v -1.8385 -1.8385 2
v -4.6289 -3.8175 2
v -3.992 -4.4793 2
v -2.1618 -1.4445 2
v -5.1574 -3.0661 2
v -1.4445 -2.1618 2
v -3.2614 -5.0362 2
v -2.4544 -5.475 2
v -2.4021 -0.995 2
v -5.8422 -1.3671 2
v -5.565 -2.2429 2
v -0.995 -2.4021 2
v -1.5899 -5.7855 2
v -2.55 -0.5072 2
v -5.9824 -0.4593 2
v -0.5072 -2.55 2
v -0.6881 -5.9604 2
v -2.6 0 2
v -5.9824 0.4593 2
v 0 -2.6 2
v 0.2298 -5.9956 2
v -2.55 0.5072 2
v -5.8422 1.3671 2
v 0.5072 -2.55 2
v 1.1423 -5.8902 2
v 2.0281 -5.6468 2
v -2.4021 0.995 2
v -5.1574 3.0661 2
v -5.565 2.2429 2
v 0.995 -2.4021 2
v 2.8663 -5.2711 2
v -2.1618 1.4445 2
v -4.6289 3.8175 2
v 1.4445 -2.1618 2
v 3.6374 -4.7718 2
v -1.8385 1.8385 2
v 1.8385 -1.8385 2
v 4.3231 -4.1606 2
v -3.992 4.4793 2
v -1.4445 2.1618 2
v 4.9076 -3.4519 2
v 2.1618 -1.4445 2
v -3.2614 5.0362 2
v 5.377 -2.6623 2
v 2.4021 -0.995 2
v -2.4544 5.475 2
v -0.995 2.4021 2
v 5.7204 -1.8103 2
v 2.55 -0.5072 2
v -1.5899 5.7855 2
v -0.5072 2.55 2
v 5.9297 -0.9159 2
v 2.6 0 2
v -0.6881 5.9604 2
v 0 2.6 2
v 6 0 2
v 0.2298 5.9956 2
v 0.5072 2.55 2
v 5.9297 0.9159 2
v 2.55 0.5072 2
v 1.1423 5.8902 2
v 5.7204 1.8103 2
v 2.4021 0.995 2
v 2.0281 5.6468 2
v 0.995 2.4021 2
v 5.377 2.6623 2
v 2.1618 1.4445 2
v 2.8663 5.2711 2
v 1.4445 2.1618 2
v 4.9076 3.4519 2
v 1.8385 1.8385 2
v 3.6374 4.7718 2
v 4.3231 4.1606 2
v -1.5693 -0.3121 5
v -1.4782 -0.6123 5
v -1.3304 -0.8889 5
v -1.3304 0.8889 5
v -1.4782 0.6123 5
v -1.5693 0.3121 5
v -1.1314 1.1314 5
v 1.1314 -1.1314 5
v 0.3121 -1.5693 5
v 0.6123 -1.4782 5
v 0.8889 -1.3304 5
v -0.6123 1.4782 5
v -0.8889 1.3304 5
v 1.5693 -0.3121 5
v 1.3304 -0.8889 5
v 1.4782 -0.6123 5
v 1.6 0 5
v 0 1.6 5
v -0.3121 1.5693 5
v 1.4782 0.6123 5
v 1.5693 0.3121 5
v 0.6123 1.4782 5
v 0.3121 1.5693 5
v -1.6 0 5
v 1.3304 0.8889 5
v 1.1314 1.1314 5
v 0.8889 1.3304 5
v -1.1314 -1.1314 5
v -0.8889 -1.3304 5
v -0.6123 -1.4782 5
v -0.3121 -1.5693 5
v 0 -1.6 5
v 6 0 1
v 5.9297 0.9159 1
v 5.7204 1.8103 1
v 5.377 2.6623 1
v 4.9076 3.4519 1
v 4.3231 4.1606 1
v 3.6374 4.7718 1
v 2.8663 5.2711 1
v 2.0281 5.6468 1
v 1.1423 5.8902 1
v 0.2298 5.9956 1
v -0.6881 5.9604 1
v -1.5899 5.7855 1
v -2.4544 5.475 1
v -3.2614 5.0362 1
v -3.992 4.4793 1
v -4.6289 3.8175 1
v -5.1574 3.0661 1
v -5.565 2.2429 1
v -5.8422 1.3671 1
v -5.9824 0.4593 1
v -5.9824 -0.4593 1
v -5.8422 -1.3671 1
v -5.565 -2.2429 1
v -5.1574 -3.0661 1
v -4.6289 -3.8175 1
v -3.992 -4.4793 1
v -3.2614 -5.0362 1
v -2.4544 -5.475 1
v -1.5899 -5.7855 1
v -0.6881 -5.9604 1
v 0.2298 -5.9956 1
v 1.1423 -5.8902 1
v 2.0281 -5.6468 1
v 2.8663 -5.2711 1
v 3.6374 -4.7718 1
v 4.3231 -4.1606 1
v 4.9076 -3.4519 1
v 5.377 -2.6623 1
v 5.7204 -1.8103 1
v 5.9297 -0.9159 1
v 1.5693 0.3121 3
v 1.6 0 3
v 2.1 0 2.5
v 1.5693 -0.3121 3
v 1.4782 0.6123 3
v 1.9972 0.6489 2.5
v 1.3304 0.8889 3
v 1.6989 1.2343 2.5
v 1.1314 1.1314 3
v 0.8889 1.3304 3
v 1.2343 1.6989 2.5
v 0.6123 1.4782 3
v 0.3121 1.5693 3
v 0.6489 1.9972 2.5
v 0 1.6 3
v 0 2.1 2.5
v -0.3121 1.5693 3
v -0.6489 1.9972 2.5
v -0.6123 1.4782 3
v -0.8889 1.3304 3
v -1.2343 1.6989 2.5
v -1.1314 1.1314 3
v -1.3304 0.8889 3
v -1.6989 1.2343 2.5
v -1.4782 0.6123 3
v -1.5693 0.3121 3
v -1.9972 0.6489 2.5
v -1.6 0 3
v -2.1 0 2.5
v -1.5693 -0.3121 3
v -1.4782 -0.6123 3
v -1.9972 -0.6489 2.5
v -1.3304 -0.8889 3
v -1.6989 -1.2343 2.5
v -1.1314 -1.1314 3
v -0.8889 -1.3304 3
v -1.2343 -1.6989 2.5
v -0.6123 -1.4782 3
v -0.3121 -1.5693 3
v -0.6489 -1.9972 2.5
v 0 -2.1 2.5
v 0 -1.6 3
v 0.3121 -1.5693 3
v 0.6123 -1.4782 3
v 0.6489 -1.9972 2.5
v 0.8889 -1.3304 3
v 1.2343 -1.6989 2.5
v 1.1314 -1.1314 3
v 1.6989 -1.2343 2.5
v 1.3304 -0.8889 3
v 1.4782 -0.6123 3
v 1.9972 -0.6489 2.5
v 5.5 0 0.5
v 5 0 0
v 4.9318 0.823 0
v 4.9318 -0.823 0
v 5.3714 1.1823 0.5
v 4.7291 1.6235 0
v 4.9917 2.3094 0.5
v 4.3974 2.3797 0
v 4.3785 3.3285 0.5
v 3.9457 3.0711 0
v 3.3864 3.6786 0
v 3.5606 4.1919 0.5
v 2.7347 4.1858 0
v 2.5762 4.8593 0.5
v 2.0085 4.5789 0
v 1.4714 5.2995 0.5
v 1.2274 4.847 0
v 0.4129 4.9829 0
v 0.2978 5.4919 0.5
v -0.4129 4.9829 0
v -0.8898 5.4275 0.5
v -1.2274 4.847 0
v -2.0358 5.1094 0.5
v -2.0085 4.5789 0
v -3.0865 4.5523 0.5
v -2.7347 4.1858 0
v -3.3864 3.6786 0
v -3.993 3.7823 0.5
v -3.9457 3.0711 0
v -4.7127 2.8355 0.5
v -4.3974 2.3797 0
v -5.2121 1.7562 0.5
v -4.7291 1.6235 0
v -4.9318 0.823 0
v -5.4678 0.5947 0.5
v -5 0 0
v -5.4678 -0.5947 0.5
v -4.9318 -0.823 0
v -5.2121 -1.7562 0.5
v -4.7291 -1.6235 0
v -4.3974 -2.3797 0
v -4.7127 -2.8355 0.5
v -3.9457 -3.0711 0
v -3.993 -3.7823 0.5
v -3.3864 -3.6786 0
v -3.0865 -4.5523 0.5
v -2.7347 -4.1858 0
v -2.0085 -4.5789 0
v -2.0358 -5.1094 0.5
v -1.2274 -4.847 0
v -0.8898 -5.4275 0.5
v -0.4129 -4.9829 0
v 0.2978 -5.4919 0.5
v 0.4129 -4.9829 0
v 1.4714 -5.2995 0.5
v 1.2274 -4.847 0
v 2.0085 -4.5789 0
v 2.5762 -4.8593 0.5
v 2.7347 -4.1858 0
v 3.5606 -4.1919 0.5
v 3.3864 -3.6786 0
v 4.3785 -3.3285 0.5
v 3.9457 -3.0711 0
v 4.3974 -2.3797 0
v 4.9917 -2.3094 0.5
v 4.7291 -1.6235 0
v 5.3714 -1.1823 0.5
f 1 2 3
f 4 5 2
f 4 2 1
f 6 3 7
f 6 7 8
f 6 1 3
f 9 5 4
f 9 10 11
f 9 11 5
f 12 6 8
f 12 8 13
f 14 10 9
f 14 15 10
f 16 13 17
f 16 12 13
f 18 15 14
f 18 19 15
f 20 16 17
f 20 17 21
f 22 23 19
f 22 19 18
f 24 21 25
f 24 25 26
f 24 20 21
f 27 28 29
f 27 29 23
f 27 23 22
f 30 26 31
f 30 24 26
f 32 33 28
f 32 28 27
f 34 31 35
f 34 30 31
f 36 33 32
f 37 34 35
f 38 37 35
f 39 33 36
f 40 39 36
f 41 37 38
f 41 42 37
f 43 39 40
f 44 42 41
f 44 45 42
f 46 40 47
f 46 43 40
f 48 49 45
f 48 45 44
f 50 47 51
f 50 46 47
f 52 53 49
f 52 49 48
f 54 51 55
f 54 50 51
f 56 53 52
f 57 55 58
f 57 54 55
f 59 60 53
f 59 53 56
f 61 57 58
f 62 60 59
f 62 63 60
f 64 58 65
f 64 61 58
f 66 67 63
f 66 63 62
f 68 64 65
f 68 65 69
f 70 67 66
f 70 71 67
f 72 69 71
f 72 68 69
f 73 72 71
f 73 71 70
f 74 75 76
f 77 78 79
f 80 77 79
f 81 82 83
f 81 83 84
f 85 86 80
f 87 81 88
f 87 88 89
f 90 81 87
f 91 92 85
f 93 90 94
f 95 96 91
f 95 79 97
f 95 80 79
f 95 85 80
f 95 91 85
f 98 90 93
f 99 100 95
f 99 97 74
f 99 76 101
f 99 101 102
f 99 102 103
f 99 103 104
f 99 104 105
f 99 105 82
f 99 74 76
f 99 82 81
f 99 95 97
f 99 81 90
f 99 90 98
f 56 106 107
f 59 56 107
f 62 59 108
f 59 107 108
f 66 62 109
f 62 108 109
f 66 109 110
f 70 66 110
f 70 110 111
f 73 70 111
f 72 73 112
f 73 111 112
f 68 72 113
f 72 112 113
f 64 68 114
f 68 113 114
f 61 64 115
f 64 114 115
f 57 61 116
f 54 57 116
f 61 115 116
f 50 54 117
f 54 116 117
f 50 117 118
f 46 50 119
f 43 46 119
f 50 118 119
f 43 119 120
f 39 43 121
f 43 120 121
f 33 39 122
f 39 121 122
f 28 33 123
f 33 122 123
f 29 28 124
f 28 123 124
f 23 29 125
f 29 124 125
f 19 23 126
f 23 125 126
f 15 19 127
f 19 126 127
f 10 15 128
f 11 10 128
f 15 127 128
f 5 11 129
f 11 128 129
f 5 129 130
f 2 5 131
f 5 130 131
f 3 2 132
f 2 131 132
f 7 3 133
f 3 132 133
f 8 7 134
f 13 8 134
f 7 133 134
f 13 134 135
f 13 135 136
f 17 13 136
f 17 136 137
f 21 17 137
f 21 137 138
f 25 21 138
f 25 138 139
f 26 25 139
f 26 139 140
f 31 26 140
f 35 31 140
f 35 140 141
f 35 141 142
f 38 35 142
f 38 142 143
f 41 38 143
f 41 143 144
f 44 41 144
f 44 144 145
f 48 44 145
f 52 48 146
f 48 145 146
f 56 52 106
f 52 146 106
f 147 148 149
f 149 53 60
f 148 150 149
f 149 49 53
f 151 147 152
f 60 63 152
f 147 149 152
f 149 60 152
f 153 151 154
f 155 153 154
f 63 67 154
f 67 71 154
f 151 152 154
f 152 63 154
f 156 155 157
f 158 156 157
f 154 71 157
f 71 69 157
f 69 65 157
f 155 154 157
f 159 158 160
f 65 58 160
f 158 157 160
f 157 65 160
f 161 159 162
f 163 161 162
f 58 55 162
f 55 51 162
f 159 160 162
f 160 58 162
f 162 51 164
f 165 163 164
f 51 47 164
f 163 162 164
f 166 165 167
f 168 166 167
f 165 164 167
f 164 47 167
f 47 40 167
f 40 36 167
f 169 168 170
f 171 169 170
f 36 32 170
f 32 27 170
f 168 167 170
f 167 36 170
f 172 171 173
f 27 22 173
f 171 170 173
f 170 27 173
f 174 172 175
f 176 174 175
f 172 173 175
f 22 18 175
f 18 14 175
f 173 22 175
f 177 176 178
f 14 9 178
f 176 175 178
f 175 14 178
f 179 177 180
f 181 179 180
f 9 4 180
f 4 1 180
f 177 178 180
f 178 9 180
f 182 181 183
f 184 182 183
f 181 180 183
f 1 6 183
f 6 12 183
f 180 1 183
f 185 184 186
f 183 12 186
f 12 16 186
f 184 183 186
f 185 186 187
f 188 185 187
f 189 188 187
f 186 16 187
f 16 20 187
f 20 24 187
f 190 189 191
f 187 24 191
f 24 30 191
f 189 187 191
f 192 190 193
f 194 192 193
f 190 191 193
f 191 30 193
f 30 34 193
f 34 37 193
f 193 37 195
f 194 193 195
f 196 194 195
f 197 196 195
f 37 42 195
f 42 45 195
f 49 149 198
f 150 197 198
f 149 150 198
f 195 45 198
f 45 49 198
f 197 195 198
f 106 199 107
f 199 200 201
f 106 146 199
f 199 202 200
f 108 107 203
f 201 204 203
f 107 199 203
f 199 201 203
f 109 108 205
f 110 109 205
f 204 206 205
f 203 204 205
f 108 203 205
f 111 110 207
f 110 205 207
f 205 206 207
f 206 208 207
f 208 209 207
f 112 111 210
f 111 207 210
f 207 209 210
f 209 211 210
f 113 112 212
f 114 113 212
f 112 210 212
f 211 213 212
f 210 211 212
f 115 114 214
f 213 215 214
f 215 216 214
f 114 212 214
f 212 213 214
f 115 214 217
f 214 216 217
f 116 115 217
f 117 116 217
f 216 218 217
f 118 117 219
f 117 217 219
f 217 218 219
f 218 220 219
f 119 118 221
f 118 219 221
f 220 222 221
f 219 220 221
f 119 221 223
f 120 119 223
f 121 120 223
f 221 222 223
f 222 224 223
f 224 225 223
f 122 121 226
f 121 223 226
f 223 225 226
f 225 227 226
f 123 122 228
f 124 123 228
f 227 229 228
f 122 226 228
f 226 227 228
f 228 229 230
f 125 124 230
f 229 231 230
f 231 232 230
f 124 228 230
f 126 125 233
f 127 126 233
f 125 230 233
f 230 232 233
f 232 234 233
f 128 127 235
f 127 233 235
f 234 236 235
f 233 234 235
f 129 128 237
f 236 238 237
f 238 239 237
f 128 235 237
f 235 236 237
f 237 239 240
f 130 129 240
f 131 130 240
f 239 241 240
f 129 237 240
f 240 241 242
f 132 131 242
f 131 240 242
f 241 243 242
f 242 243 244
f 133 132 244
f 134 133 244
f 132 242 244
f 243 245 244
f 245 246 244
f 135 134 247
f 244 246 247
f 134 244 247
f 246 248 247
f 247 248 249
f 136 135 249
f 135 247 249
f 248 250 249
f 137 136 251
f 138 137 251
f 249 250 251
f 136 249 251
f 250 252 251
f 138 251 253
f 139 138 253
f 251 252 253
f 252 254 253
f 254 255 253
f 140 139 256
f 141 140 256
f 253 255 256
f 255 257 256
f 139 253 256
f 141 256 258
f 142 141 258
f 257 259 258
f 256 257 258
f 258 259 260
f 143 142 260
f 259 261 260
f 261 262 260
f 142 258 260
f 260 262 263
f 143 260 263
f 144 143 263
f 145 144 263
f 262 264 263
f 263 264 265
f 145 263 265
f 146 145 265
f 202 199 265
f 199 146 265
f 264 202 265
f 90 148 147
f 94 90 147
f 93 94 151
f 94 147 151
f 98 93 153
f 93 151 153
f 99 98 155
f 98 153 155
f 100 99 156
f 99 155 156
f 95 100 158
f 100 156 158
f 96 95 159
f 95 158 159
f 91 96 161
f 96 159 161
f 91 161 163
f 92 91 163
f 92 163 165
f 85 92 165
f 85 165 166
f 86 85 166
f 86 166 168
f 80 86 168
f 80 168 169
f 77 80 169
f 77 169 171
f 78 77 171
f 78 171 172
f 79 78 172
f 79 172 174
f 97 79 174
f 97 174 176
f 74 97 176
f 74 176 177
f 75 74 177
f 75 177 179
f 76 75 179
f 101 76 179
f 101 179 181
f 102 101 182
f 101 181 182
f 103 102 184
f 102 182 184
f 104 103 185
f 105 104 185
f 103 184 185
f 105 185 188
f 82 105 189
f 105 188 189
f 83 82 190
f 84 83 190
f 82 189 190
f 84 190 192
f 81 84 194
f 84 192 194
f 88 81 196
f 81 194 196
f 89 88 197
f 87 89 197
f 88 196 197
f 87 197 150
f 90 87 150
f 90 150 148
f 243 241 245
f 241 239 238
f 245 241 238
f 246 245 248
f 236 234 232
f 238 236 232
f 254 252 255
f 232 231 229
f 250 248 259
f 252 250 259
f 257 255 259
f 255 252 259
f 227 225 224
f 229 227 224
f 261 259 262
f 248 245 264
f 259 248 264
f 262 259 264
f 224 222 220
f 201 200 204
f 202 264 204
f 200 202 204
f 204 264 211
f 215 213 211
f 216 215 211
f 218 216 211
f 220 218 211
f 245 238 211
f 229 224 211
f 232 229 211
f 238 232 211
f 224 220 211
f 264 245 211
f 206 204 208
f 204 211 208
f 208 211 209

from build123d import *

# Parameters (mm, degrees)
F0_R     = 6
F0_R_2   = 1.6
F1_DEPTH = 2
F2_DEPTH = 5
F3_SIZE  = 1


with BuildPart() as f1:
    # F0 (on Top) → F1 (new body)
    with BuildSketch(Plane.XY):
        Circle(F0_R)
        Circle(F0_R_2, mode=Mode.SUBTRACT)
    extrude(amount=F1_DEPTH)

    # F0 (on Top) → F2 (join)
    with BuildSketch(Plane.XY):
        Circle(F0_R_2)
    extrude(amount=F2_DEPTH)

    # F3
    f3_edges = [f1.edges().sort_by_distance(p)[0] for p in [
        (-6, 0, 0),
        (-1.6, 0, 2),
    ]]
    chamfer(f3_edges, length=F3_SIZE)


solid = f1.part
